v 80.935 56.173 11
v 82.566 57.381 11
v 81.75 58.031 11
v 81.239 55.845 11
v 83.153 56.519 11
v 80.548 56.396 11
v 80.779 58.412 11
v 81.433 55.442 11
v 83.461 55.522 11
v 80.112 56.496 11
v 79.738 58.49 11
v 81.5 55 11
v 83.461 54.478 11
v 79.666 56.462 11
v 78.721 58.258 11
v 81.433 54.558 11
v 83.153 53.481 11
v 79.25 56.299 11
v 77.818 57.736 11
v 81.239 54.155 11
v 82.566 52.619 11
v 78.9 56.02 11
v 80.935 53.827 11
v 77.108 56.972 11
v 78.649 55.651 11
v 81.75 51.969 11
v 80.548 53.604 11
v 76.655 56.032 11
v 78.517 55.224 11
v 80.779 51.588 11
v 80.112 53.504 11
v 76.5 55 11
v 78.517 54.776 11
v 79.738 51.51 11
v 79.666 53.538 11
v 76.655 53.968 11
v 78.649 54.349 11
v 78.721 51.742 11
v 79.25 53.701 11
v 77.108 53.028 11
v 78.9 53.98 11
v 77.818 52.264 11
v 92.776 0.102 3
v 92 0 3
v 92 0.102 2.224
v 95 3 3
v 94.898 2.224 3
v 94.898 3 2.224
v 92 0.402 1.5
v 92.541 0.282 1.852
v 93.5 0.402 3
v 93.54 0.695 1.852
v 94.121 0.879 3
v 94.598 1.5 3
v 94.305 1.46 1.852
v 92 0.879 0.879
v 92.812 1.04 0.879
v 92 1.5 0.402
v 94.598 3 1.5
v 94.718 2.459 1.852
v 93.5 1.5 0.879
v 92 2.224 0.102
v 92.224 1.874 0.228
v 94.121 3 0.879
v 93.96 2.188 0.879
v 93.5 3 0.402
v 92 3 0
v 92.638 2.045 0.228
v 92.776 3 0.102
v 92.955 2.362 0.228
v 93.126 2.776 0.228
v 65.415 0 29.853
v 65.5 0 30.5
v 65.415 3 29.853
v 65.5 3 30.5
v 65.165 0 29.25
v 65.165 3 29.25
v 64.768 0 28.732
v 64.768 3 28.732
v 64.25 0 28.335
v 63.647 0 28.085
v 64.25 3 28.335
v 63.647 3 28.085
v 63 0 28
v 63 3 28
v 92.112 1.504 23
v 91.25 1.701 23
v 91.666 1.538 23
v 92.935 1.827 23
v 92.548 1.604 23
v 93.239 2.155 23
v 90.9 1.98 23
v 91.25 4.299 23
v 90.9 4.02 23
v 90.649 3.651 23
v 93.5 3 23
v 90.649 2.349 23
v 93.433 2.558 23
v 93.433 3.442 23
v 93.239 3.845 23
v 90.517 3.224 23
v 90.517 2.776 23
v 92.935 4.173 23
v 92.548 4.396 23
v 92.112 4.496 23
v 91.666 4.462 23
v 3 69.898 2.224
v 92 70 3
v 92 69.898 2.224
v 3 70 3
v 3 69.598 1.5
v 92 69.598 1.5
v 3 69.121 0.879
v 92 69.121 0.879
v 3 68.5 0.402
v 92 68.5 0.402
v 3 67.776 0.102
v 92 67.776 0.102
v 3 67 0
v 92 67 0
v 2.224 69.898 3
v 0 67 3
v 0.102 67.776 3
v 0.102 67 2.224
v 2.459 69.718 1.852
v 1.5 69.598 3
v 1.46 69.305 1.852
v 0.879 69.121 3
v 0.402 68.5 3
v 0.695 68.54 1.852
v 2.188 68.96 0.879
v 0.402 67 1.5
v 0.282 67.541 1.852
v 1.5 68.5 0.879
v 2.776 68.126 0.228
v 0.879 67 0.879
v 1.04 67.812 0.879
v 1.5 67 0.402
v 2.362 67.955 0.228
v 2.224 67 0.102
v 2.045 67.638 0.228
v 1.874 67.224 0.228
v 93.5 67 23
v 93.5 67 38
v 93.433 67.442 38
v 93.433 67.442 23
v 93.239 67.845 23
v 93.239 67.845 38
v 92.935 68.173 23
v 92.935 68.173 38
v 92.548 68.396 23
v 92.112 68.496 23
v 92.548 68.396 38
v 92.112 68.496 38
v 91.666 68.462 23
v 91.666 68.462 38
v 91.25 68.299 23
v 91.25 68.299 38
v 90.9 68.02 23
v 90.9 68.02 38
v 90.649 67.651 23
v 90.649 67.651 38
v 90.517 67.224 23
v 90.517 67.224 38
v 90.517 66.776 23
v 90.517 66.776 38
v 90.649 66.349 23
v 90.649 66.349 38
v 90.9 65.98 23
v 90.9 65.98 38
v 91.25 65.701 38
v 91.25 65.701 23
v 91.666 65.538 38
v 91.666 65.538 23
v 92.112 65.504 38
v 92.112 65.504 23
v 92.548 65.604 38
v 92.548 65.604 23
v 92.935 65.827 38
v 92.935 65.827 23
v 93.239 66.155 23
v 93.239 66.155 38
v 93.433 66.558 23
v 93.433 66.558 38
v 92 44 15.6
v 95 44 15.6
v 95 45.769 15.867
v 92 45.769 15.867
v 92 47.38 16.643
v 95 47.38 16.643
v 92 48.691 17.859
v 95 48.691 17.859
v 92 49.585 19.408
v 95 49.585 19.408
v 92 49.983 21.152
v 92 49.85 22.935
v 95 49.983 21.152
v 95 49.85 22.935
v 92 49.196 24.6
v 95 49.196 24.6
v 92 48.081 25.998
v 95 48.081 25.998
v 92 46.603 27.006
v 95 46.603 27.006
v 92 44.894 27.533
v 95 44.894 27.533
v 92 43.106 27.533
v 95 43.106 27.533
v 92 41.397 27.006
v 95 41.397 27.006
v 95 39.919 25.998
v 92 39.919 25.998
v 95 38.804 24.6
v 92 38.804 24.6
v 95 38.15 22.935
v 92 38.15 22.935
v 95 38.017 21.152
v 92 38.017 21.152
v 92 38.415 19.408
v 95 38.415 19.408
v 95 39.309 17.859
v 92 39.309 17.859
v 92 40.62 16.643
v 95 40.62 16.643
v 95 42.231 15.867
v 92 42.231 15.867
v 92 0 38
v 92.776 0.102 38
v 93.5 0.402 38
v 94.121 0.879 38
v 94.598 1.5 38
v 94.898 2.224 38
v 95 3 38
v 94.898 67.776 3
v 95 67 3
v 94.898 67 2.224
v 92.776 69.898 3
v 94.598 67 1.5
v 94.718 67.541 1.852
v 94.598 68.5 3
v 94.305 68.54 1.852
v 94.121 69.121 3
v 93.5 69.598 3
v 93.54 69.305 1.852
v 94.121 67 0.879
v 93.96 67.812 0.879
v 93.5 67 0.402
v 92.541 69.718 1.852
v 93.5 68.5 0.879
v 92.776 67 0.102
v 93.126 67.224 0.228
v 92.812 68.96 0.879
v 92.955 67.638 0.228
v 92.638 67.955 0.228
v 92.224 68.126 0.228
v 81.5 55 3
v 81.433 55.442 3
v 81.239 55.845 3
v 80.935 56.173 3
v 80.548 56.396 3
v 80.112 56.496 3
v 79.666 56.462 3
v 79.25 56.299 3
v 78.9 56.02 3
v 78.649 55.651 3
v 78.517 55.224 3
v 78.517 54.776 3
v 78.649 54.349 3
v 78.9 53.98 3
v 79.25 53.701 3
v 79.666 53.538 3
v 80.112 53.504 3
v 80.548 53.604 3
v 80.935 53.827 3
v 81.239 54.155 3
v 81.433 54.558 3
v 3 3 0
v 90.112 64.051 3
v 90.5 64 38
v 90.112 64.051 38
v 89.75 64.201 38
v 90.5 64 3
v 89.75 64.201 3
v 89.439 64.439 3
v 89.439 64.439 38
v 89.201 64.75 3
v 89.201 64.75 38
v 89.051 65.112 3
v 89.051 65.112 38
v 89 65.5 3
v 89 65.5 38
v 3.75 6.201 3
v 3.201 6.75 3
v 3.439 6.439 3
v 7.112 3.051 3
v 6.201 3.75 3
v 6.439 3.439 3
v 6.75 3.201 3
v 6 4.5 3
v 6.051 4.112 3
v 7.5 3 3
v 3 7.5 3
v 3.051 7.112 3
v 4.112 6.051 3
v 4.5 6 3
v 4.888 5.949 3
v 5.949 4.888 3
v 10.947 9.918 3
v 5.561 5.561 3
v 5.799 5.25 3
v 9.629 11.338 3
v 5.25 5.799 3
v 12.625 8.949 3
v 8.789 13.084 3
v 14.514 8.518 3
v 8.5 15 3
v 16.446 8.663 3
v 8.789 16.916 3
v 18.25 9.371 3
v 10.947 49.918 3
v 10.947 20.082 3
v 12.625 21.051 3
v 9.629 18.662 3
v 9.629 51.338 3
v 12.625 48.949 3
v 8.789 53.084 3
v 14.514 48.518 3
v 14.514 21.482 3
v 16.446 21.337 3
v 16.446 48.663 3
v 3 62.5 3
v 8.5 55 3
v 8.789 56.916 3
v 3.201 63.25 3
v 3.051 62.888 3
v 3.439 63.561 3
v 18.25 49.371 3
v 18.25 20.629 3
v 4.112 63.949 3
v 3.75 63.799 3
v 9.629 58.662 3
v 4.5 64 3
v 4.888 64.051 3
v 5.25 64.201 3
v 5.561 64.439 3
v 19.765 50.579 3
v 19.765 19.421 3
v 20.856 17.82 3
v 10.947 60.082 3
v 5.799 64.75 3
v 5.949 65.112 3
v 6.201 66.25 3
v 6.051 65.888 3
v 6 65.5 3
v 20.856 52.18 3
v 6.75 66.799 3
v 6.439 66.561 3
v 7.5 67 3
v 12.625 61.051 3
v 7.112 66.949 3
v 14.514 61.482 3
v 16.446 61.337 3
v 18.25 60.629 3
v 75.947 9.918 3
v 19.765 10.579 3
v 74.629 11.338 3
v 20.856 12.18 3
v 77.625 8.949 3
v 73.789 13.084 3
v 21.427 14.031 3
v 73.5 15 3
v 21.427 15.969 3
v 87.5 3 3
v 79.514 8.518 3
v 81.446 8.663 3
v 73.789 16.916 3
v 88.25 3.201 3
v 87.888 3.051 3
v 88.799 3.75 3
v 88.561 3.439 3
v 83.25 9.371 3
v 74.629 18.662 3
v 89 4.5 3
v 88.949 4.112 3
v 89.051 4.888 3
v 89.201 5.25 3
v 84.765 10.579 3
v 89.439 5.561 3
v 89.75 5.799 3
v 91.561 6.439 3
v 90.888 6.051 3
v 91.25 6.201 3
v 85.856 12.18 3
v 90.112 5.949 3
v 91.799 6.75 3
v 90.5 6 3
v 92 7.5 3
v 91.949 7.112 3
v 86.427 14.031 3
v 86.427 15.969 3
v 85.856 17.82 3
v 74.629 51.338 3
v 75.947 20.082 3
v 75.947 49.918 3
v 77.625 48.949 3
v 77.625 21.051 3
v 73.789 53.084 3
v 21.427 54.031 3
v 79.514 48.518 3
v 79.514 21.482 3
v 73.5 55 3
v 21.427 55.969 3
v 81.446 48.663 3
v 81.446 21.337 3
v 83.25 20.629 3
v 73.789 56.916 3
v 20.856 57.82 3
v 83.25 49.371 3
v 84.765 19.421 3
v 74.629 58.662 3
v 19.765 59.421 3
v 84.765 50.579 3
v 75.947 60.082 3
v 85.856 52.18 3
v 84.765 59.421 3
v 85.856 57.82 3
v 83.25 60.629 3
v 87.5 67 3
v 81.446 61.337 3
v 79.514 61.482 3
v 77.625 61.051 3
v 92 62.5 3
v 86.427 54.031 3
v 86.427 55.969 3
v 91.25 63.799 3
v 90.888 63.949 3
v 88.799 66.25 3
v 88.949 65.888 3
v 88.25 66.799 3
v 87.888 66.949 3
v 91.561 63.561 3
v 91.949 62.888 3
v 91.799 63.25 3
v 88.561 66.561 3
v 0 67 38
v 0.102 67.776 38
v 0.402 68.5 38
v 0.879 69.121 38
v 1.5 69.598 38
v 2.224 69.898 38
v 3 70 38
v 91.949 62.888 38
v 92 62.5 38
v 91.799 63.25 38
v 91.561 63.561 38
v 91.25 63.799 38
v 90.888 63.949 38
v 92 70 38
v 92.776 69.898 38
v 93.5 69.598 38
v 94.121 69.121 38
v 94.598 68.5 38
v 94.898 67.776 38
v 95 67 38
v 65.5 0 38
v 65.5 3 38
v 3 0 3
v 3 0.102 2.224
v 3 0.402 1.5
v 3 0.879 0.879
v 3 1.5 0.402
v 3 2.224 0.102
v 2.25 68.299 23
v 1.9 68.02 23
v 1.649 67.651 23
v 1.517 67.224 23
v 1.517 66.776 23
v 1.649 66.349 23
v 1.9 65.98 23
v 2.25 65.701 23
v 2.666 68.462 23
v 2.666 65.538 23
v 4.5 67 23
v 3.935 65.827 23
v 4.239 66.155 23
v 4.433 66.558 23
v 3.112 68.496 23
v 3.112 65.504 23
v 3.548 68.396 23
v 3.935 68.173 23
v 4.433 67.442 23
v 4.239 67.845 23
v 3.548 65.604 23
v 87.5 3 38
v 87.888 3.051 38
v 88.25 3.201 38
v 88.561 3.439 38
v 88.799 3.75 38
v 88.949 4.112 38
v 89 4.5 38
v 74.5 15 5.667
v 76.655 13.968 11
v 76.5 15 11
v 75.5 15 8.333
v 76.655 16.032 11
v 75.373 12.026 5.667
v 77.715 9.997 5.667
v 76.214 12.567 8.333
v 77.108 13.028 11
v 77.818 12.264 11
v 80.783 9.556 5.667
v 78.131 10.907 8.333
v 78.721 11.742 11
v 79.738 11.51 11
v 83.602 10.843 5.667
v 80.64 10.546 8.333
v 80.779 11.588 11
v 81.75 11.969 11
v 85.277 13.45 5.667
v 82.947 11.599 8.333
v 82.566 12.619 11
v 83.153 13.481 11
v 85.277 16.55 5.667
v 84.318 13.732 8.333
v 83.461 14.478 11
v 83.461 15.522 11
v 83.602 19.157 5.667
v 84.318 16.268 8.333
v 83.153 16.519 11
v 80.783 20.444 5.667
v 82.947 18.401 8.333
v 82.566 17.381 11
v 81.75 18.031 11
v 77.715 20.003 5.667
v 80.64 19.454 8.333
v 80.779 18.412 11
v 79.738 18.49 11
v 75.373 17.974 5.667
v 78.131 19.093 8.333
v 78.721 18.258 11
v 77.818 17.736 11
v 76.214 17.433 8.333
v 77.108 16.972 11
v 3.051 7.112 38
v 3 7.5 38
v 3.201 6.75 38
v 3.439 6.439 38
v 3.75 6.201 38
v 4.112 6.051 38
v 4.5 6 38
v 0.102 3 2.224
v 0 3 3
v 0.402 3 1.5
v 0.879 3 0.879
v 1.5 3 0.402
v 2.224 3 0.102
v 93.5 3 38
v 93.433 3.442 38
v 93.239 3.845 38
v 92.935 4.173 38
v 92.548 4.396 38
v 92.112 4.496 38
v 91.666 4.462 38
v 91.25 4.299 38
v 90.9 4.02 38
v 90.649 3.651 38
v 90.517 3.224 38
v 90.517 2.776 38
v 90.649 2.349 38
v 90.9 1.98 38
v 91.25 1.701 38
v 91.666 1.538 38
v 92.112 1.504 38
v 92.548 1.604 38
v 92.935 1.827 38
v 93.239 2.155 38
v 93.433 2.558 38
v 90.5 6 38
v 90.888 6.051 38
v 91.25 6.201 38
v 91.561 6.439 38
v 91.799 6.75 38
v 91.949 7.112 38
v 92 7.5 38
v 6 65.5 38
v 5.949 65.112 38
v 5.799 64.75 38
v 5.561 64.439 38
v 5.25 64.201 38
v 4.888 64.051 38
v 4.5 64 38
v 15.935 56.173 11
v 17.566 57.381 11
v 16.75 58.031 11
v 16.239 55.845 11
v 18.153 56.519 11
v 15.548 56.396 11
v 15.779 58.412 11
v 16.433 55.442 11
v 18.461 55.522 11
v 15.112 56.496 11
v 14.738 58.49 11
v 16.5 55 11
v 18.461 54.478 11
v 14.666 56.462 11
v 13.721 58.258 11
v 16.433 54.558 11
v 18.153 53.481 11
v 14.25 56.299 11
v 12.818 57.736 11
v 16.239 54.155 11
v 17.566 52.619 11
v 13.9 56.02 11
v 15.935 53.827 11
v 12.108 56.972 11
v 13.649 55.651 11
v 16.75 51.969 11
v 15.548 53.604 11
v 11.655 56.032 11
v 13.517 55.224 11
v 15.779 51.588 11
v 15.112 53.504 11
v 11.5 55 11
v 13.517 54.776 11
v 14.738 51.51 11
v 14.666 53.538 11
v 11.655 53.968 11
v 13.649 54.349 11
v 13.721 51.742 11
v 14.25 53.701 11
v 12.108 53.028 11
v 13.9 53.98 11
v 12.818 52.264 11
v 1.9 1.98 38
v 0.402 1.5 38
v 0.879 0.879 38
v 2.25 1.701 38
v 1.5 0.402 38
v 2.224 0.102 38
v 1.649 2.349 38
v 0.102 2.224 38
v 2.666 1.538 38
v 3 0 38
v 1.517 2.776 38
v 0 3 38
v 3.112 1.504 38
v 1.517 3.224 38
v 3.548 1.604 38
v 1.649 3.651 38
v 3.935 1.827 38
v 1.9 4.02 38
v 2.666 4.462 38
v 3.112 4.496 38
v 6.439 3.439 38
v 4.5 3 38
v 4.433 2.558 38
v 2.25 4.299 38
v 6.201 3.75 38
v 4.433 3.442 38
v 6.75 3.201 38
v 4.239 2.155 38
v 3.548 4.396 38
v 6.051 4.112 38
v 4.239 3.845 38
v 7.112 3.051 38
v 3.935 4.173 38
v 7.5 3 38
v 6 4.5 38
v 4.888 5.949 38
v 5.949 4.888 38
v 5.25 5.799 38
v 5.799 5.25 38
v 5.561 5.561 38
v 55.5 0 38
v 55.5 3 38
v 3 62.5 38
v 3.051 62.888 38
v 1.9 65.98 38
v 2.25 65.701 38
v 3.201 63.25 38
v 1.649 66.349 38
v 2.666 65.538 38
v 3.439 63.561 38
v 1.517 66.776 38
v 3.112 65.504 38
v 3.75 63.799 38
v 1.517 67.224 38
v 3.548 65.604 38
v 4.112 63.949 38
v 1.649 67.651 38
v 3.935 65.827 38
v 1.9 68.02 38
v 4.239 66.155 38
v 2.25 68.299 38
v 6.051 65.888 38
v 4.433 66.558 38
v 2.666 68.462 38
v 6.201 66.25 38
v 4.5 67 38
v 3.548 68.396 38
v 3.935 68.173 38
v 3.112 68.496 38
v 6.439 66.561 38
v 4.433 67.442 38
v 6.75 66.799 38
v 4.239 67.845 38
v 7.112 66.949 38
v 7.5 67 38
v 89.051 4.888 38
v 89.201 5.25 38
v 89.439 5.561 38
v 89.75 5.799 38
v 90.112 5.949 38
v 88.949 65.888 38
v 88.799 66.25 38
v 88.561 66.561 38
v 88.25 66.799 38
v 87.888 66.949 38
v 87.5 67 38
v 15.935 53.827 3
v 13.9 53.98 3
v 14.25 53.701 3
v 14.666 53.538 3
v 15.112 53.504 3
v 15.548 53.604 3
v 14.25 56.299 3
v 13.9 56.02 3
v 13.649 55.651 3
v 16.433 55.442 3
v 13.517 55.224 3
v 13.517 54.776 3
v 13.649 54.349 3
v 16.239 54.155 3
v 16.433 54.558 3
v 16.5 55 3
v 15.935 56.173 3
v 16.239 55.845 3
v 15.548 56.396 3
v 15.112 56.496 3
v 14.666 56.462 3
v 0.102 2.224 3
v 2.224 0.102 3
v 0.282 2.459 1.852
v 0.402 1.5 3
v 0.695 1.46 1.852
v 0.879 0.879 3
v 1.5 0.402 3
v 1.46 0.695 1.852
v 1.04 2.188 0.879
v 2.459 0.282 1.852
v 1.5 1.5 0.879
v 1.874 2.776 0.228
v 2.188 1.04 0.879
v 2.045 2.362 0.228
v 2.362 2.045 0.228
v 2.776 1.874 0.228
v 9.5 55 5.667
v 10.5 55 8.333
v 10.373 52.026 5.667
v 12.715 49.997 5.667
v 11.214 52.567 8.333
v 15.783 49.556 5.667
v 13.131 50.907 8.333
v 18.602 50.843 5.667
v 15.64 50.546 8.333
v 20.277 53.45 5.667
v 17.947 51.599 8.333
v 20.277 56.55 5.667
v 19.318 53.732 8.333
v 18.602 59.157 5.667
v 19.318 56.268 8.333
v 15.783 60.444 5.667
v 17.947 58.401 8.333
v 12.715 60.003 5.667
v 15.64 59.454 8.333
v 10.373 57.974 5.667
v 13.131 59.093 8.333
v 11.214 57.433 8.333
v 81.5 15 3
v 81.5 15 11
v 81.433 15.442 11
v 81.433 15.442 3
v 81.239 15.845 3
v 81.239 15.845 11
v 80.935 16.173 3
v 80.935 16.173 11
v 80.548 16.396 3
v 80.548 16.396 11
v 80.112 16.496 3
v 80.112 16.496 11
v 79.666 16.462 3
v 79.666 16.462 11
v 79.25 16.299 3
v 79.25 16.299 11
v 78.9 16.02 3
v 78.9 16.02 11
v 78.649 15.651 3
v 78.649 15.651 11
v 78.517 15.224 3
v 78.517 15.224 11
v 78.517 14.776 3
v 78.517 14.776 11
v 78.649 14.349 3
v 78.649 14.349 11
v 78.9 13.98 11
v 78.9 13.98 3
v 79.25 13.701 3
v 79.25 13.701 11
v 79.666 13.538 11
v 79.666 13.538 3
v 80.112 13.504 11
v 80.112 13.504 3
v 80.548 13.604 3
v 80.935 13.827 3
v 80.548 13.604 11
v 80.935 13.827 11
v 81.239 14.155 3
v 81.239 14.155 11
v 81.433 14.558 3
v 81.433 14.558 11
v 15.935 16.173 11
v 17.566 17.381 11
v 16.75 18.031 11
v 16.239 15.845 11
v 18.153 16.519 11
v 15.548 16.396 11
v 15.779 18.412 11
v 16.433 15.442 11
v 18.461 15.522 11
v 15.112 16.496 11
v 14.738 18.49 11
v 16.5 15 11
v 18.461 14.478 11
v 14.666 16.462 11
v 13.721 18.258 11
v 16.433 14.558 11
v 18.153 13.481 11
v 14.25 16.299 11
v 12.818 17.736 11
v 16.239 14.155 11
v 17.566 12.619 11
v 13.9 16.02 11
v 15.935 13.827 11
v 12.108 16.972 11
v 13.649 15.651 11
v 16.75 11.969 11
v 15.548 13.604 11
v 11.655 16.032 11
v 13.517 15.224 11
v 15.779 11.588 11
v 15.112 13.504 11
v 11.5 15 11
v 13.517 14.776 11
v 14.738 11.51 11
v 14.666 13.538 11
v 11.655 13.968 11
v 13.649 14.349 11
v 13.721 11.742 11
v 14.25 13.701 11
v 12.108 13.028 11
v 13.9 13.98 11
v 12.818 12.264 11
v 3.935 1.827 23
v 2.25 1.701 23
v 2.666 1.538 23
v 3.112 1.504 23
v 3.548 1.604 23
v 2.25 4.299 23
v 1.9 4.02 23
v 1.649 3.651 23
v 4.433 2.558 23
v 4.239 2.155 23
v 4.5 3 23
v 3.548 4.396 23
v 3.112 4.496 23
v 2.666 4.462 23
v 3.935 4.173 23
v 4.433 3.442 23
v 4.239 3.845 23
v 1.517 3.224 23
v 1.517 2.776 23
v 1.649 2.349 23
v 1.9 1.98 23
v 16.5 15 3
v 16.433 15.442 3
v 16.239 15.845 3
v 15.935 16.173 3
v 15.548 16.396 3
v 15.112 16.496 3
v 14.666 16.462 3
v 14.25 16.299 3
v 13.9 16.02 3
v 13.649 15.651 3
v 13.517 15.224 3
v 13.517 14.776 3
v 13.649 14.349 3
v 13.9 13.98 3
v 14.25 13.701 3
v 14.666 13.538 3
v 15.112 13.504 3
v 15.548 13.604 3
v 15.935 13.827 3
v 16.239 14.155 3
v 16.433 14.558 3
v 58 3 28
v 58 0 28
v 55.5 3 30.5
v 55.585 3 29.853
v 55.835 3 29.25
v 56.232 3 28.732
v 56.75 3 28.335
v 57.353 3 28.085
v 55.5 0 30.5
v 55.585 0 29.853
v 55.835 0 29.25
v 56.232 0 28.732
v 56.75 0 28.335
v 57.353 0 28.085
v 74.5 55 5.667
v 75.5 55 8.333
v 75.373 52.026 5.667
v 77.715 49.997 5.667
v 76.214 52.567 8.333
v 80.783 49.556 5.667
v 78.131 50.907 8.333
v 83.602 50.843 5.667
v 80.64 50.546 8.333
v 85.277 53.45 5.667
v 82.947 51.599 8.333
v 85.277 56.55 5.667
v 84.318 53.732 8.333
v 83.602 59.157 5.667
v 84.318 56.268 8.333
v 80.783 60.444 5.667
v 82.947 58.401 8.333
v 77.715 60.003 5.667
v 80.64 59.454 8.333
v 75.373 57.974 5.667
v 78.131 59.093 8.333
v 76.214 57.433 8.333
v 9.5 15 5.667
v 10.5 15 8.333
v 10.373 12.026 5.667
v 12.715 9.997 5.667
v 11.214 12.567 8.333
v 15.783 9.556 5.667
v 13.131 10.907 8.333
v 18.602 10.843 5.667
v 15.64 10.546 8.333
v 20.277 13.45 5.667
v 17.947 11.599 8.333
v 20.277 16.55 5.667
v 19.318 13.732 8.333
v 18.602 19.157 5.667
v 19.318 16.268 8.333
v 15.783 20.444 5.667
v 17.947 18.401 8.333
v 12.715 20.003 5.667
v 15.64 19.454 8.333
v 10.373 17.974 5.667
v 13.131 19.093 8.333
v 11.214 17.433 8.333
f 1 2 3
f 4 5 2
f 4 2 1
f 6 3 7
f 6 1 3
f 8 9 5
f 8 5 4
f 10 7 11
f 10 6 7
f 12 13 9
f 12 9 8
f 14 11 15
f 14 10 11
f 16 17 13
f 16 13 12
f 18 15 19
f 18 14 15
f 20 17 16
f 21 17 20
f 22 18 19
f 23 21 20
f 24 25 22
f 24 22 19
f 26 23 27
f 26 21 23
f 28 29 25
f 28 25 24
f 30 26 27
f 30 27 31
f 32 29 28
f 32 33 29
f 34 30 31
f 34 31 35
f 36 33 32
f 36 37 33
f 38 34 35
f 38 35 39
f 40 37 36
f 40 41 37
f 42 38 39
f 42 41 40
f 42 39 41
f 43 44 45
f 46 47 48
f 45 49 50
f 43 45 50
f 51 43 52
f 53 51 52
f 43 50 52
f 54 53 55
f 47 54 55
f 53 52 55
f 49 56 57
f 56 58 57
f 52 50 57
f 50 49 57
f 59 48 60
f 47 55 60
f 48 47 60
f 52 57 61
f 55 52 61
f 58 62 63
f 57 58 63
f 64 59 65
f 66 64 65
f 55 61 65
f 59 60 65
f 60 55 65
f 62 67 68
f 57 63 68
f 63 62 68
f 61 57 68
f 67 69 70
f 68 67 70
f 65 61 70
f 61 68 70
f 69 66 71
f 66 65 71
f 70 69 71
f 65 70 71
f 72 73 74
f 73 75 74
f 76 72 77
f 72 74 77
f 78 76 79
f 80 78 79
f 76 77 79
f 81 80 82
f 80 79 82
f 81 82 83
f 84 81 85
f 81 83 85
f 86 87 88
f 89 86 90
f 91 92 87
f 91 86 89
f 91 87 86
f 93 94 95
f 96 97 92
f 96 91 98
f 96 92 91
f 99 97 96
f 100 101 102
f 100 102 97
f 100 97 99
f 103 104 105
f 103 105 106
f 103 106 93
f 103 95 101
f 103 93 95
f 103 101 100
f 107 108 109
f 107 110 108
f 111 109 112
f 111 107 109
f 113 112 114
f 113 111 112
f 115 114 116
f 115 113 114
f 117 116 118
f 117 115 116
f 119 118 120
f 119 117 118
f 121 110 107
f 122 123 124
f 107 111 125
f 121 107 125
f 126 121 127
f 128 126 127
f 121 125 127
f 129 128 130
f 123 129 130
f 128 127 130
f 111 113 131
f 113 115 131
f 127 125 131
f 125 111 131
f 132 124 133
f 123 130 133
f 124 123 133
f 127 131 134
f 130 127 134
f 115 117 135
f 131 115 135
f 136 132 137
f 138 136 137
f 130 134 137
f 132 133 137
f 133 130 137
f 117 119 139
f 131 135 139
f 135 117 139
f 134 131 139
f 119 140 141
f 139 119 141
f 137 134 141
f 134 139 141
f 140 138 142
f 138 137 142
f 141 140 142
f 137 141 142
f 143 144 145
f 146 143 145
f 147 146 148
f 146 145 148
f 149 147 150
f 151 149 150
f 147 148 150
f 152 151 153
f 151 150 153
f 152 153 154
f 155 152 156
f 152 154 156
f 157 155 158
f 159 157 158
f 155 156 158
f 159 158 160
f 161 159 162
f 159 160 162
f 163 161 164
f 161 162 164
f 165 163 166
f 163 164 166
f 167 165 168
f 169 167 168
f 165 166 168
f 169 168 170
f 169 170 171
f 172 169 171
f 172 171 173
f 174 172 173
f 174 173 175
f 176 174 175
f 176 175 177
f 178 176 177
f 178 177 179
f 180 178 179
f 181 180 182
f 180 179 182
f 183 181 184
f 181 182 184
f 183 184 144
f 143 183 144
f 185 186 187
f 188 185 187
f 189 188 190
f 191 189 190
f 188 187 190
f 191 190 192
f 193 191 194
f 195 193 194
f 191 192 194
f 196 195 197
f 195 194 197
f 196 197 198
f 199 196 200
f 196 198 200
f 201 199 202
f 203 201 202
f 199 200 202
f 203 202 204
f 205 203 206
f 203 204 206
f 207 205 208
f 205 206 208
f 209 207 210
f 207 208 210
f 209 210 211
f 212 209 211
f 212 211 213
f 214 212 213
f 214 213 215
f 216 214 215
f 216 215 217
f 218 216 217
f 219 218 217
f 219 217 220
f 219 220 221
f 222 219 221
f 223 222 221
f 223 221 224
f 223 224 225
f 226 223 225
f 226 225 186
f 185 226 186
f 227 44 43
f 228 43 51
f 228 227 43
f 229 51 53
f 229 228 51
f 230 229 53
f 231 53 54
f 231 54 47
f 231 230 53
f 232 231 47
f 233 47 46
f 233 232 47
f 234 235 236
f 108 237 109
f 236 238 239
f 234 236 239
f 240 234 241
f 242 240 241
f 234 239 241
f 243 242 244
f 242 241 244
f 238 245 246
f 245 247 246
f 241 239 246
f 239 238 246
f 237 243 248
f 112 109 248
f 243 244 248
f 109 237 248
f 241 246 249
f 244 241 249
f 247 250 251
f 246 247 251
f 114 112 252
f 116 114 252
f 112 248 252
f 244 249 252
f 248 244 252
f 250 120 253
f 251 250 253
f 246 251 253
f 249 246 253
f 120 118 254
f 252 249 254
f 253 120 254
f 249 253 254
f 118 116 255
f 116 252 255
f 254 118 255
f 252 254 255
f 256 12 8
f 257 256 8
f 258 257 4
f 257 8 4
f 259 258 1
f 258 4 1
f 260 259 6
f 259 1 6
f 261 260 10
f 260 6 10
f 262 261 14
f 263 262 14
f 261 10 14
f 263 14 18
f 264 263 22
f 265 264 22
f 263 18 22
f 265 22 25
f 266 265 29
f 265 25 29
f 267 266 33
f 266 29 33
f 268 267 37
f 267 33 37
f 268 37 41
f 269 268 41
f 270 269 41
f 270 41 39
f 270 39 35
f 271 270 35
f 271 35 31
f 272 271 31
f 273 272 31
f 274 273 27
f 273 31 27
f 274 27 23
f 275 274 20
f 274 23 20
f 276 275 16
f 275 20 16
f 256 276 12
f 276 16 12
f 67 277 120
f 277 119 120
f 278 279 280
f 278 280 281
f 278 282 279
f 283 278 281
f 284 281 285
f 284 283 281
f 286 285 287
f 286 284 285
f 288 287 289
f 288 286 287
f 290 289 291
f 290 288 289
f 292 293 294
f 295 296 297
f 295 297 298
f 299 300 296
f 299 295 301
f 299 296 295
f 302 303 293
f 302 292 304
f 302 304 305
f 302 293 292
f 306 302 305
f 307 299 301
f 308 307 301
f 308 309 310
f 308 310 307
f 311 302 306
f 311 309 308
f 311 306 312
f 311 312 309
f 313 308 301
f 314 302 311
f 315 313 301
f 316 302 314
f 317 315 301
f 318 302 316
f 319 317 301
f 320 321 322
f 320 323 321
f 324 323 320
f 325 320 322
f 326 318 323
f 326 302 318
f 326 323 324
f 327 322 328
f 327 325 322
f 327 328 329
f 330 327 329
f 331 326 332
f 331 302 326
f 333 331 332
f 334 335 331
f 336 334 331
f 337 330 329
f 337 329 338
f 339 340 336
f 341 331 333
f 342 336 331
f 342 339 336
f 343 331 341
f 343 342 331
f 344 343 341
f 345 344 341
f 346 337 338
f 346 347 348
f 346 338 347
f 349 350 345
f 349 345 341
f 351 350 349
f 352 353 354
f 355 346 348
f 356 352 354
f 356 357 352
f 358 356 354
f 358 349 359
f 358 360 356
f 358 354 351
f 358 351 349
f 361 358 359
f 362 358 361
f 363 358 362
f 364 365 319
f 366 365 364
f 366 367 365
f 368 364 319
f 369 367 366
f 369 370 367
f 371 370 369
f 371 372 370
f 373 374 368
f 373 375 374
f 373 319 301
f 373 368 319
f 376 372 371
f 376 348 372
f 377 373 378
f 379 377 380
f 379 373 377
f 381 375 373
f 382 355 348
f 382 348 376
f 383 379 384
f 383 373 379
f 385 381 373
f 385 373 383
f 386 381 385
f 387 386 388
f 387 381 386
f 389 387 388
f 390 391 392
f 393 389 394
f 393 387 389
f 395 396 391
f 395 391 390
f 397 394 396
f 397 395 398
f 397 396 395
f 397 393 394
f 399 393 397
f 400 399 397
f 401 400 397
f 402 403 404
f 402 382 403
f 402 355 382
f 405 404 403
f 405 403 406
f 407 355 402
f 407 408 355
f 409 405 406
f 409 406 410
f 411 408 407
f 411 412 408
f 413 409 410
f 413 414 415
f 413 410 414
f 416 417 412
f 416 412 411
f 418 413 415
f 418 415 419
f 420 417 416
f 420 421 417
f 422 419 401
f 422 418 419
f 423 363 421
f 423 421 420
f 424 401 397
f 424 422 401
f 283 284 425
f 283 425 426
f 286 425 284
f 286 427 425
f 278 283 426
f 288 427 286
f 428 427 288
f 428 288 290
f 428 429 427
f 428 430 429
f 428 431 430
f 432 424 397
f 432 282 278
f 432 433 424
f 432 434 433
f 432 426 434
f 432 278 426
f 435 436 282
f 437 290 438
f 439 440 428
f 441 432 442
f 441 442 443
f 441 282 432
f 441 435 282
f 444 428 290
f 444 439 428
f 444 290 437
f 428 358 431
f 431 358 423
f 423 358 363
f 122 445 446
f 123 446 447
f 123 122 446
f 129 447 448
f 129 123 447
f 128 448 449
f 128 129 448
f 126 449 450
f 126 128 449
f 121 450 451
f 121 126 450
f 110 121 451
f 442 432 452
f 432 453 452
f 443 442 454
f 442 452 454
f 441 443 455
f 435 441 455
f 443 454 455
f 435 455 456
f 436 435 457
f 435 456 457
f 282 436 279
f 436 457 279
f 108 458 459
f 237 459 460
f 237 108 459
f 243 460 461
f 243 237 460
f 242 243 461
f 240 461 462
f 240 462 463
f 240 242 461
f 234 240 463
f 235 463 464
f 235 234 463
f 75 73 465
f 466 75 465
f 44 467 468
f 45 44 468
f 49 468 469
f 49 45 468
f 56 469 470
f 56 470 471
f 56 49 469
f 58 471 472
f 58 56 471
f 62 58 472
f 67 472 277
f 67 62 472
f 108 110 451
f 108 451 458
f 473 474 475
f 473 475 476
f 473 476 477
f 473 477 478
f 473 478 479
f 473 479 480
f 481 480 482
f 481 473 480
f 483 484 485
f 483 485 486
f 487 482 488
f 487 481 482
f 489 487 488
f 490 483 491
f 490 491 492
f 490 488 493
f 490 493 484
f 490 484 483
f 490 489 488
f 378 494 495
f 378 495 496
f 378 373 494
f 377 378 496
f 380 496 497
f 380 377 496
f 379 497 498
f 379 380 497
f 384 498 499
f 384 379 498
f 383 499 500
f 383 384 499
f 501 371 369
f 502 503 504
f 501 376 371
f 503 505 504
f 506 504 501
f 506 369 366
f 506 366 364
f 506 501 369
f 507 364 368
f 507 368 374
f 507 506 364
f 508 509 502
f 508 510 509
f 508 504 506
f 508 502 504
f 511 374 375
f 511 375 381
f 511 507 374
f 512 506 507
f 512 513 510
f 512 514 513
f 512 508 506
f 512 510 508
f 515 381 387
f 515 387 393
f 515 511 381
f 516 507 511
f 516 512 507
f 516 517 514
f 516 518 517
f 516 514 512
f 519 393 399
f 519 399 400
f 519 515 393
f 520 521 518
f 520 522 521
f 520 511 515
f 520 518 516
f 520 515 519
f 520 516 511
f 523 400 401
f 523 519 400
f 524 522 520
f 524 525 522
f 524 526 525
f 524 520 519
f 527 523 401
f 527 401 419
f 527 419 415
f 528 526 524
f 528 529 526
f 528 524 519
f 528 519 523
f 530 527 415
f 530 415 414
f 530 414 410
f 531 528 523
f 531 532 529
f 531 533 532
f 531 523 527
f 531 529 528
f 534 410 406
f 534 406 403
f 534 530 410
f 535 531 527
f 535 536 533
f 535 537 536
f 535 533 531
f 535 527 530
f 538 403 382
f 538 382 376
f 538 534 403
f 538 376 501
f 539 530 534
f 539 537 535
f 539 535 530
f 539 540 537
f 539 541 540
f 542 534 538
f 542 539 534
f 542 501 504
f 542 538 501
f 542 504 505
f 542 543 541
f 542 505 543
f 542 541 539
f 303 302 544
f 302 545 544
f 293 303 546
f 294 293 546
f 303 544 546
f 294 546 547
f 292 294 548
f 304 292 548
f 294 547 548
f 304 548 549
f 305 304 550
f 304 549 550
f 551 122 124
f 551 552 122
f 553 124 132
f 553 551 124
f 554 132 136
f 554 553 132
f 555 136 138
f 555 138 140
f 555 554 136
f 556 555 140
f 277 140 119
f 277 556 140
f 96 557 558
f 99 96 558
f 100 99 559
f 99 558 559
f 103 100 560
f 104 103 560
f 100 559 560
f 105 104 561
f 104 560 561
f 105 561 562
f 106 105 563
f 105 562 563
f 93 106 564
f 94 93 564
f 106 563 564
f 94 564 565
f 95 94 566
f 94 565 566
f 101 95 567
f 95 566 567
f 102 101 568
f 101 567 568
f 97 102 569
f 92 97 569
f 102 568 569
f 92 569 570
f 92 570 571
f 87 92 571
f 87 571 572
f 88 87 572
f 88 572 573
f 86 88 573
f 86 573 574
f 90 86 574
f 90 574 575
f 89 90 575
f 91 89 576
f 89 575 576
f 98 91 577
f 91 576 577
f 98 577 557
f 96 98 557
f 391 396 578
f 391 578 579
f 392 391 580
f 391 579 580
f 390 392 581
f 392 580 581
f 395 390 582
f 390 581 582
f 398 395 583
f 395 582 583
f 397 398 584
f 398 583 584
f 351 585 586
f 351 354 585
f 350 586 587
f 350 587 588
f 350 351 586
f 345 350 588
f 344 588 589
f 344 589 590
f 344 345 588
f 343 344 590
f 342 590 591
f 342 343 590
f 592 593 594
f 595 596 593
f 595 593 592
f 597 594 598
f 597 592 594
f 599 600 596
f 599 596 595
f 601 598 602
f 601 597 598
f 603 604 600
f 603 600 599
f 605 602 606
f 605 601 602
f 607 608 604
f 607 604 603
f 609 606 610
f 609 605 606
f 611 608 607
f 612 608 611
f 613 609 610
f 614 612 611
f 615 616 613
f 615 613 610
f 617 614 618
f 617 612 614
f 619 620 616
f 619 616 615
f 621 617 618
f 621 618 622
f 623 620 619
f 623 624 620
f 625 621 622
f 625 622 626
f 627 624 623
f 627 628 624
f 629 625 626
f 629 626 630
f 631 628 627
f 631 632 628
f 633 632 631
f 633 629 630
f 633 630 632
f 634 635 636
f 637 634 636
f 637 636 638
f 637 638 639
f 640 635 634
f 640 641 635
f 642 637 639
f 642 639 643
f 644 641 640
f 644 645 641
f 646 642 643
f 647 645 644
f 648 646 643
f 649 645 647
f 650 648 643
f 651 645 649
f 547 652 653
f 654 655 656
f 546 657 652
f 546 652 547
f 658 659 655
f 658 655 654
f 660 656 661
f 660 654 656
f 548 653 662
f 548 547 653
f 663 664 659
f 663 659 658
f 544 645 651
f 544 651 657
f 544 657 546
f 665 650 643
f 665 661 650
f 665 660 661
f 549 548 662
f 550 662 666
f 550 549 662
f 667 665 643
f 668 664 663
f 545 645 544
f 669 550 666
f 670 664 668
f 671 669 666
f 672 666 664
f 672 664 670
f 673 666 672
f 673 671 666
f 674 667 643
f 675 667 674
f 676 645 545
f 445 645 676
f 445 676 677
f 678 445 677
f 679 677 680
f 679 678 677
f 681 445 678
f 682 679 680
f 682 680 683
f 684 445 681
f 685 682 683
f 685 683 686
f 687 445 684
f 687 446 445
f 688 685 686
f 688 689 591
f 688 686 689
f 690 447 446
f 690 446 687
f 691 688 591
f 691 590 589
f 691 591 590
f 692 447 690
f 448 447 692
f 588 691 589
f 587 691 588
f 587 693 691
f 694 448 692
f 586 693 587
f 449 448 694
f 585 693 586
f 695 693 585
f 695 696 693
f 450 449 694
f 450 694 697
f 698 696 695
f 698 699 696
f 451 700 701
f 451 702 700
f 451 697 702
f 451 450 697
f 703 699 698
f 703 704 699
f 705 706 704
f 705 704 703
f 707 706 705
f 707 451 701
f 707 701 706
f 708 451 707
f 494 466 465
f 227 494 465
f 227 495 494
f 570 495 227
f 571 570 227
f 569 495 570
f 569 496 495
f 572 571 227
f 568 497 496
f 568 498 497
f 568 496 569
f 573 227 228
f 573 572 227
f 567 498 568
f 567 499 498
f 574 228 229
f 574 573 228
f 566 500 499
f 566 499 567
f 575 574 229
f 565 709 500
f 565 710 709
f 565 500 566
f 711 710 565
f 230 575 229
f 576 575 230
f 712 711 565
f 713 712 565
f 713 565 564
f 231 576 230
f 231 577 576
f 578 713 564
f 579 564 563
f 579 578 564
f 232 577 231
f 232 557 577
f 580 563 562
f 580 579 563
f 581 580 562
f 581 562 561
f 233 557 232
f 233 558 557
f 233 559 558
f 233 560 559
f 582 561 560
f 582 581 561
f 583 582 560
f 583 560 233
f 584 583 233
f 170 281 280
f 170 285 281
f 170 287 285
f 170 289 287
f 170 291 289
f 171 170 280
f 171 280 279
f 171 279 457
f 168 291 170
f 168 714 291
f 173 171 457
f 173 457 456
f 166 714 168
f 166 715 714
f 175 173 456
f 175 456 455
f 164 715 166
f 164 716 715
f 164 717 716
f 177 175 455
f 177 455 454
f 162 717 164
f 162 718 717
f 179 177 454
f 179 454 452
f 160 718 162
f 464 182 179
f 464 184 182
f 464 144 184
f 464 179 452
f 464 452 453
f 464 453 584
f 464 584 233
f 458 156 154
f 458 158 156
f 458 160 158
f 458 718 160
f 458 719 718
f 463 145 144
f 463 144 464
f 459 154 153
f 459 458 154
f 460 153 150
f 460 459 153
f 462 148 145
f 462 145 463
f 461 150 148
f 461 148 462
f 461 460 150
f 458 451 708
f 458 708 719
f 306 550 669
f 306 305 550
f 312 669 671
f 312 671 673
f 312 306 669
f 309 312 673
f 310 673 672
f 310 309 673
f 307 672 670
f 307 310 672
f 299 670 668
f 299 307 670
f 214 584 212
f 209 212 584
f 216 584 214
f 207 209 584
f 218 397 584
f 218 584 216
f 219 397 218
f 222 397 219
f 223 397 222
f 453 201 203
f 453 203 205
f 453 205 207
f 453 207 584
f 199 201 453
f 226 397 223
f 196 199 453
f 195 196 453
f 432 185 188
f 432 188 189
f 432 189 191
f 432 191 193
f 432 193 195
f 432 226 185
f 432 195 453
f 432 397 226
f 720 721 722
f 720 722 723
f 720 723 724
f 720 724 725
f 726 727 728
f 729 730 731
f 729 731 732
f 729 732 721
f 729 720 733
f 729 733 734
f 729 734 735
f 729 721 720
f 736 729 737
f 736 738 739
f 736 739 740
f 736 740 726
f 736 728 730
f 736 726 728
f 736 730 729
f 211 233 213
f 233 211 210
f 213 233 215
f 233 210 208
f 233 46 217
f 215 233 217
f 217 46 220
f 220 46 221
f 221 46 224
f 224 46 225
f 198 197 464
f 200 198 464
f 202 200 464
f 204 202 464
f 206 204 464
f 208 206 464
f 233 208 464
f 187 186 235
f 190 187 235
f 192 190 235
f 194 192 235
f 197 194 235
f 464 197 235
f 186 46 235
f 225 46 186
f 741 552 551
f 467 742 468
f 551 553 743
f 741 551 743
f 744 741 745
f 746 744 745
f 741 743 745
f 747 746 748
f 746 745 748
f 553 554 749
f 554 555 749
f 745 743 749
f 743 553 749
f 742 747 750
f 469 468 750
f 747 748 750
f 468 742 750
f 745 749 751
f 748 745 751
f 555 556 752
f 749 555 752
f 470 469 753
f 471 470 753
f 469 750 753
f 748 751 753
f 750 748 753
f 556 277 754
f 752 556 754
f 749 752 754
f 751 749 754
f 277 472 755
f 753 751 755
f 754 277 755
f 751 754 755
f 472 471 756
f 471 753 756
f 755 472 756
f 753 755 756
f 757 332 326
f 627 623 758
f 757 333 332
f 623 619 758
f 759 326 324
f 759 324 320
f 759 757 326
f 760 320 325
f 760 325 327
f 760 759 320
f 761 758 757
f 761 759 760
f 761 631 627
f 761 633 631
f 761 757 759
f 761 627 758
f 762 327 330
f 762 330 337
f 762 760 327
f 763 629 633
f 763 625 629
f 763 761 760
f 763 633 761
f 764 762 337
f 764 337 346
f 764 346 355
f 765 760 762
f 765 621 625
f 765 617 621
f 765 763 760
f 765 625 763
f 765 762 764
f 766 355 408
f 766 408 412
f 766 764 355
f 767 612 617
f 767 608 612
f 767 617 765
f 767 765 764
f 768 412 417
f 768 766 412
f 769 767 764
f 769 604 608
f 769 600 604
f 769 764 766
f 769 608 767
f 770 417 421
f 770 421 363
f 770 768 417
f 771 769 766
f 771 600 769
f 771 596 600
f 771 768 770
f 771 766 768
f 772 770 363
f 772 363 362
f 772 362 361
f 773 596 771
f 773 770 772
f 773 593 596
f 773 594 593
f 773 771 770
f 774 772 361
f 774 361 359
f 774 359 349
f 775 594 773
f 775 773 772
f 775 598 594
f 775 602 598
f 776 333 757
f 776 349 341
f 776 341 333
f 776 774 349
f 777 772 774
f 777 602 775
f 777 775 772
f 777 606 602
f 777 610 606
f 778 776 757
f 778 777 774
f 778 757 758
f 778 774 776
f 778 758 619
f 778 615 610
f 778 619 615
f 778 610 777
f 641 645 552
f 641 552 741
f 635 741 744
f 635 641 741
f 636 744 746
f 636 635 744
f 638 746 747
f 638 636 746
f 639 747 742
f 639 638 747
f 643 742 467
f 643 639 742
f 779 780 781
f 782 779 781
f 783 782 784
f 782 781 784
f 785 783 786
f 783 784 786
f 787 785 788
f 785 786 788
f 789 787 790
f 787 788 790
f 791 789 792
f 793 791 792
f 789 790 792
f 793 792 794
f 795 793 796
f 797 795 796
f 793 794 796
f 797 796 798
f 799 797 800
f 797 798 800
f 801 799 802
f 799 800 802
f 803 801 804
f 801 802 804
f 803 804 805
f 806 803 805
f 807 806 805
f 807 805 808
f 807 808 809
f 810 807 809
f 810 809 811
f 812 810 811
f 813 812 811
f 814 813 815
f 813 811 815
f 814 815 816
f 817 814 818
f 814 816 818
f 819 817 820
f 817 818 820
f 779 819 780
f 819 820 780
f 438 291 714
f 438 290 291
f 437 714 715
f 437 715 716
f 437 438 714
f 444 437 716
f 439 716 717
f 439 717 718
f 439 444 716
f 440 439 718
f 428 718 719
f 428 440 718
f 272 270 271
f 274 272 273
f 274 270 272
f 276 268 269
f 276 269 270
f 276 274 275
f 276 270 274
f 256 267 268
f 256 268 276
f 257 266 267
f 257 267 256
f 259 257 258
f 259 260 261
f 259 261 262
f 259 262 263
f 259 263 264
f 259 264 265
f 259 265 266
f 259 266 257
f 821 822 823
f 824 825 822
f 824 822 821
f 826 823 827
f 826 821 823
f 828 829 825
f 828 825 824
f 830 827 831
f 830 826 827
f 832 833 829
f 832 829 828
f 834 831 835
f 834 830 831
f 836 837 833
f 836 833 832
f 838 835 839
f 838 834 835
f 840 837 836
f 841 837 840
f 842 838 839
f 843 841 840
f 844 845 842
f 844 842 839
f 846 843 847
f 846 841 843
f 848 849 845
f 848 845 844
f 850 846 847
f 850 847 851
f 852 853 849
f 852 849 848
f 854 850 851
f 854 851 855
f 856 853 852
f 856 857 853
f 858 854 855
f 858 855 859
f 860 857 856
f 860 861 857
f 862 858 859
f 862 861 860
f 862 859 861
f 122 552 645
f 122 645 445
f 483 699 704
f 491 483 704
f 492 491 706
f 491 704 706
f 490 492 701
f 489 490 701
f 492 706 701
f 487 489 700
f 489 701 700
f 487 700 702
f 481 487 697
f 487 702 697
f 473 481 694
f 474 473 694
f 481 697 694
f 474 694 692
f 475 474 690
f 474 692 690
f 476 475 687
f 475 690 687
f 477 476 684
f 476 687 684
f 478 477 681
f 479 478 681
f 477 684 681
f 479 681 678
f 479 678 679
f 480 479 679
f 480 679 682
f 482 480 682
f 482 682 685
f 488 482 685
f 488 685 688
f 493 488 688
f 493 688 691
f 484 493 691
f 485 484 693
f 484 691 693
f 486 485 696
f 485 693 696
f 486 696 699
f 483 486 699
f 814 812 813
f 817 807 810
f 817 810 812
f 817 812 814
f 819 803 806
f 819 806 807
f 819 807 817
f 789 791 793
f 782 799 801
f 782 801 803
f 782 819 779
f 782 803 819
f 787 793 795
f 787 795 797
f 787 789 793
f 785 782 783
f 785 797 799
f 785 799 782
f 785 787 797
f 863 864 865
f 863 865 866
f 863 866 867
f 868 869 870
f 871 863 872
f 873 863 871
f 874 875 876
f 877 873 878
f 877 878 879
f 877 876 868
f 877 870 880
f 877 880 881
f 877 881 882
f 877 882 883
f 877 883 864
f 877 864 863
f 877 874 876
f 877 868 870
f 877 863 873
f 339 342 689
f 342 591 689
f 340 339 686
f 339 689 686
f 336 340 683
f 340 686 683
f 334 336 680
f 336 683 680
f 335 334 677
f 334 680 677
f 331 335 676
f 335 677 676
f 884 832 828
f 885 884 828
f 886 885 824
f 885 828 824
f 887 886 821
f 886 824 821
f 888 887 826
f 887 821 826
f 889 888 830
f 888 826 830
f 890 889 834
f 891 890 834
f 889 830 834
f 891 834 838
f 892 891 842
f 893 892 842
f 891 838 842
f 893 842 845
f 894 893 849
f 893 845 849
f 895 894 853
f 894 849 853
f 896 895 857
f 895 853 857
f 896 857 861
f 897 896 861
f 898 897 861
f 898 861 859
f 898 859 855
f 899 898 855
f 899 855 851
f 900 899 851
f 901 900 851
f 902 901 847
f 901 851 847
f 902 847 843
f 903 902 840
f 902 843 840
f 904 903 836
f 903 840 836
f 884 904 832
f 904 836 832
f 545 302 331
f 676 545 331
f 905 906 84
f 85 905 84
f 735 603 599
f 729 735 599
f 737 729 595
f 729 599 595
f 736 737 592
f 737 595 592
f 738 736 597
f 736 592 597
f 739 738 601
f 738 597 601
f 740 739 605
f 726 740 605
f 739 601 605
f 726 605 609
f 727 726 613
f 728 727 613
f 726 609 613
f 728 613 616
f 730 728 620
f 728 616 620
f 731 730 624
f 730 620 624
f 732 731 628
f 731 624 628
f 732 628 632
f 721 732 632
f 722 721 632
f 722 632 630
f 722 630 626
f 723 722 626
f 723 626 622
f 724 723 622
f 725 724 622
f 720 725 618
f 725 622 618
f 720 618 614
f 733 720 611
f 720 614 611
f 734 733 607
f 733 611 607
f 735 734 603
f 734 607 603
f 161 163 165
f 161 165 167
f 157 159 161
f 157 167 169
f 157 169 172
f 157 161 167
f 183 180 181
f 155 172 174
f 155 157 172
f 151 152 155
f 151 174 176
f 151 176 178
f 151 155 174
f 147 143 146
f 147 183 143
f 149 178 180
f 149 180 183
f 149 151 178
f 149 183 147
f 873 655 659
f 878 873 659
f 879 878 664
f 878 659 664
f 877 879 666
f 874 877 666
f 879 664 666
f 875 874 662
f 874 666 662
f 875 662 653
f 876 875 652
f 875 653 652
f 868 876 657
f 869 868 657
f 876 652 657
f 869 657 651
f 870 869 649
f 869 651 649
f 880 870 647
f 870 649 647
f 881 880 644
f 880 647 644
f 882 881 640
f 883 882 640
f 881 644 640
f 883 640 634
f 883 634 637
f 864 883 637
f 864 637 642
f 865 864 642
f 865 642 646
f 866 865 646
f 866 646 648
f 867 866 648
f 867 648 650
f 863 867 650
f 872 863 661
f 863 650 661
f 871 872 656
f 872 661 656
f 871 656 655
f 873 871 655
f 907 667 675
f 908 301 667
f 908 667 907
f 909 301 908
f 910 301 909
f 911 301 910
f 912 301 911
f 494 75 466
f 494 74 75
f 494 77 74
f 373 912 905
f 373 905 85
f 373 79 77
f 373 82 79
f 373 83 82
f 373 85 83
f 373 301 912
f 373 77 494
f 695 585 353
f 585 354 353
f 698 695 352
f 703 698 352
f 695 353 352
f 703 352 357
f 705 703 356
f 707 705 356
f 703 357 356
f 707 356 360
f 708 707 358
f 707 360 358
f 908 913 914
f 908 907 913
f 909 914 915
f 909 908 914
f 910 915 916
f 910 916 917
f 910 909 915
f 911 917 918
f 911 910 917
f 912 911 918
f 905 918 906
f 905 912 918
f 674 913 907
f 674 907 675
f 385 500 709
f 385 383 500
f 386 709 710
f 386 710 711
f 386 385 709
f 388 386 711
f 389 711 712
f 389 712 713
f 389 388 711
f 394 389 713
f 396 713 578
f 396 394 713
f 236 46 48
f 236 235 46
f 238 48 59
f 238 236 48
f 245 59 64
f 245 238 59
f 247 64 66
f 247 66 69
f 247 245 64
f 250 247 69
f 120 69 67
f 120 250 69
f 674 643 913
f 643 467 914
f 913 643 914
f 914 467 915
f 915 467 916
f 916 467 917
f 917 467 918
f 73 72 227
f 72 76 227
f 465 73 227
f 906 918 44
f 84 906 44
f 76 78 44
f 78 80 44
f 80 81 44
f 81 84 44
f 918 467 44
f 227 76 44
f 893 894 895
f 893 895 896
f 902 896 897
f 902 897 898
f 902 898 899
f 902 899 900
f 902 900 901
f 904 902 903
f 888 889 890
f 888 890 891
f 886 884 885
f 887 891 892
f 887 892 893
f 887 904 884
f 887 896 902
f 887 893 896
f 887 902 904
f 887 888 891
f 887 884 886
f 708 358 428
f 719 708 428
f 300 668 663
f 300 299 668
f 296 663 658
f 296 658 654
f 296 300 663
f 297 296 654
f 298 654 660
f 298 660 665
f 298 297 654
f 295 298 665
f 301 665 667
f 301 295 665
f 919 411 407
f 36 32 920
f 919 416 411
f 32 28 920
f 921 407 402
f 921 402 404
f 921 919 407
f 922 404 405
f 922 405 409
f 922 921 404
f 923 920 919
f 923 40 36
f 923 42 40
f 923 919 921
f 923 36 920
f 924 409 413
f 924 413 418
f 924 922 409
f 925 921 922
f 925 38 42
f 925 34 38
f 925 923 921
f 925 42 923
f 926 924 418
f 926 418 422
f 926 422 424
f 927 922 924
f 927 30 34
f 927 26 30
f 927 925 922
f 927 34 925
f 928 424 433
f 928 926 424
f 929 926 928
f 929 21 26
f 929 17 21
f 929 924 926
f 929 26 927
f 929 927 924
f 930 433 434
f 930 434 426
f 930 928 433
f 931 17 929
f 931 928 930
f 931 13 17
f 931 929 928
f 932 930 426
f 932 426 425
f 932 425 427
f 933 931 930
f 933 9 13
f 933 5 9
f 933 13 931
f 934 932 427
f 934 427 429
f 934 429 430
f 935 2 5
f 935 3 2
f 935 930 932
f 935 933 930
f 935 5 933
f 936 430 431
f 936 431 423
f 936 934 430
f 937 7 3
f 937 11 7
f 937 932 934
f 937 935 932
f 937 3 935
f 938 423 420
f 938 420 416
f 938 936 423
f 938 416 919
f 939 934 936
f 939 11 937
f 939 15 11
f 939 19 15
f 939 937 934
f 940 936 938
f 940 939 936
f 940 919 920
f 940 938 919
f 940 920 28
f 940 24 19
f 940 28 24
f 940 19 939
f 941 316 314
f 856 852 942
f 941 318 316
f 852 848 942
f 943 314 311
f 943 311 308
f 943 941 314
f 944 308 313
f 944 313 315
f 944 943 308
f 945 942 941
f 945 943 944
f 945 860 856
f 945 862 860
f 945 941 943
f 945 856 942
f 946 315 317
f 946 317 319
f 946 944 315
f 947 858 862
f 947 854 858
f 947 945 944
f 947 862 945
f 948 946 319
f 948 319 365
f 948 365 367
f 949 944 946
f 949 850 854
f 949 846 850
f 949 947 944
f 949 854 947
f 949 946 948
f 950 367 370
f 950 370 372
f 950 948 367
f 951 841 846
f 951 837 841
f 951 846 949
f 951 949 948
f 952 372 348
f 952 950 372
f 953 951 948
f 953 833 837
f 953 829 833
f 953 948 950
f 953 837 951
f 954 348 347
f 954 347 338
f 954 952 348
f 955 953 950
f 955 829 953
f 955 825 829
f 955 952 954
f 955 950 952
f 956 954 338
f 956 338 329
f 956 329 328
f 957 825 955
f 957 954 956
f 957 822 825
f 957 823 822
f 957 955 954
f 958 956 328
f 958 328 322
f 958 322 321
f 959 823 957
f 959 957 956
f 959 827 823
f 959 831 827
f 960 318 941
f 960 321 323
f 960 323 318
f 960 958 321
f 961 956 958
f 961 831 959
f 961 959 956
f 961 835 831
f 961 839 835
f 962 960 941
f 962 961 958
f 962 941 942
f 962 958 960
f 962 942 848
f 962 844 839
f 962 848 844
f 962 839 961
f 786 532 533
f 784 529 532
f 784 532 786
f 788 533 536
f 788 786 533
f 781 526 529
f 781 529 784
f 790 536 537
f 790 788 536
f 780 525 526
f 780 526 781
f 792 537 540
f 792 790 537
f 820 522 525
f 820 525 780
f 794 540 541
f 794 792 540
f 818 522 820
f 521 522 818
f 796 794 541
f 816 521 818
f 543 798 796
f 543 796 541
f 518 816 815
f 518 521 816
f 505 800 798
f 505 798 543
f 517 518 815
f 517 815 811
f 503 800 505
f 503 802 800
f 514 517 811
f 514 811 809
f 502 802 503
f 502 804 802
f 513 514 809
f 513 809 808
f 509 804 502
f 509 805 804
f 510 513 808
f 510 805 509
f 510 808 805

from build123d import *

# Parameters (mm, degrees)
SKETCH_1_W          = 95
SKETCH_1_H          = 70
EXTRUDE_1_DEPTH     = 3
SKETCH_2_R          = 3.5
EXTRUDE_2_DEPTH     = 8
SKETCH_3_R          = 1.5
CUT_EXTRUDE_1_DEPTH = 8
CHAMFER_2_SIZE      = 3
CHAMFER_2_SIZE_2    = 8
SKETCH_6_W          = 95
SKETCH_6_H          = 70
SKETCH_6_W_2        = 89
SKETCH_6_H_2        = 64
EXTRUDE_3_DEPTH     = 35
SKETCH_8_W          = 6
SKETCH_8_H          = 6
EXTRUDE_4_DEPTH     = 35
FILLET_4_R          = 1.5
SKETCH_10_R         = 1.5
CUT_EXTRUDE_2_DEPTH = 15
FILLET_6_R          = 3
SKETCH_11_R         = 6
CUT_EXTRUDE_3_DEPTH = 15
SKETCH_12_W         = 10
SKETCH_12_H         = 10
CUT_EXTRUDE_4_DEPTH = 15
FILLET_9_R          = 2.5
FILLET_10_R         = 3


# Some blends are built 0.0001 mm under size
with BuildPart() as part:
    # ｽｹｯﾁ1 → ﾎﾞｽ - 押し出し1 (new body)
    with BuildSketch(Plane.XY):
        with Locations((47.5, 35)):
            Rectangle(SKETCH_1_W, SKETCH_1_H)
    extrude(amount=EXTRUDE_1_DEPTH)

    # ｽｹｯﾁ2 → ﾎﾞｽ - 押し出し2 (add)
    with BuildSketch(Plane.XY.offset(3)):
        with Locations(Location((15, 55, 0), (0, 0, 180))):
            Circle(SKETCH_2_R)
        with Locations(Location((15, 15, 0), (0, 0, 180))):
            Circle(SKETCH_2_R)
        with Locations(Location((80, 55, 0), (0, 0, 180))):
            Circle(SKETCH_2_R)
        with Locations(Location((80, 15, 0), (0, 0, 180))):
            Circle(SKETCH_2_R)
    extrude(amount=EXTRUDE_2_DEPTH)

    # ｽｹｯﾁ3 → ｶｯﾄ - 押し出し1 (cut)
    with BuildSketch(Plane.XY.offset(11)):
        with Locations((15, 55)):
            Circle(SKETCH_3_R)
        with Locations((80, 55)):
            Circle(SKETCH_3_R)
        with Locations((15, 15)):
            Circle(SKETCH_3_R)
        with Locations((80, 15)):
            Circle(SKETCH_3_R)
    extrude(amount=-CUT_EXTRUDE_1_DEPTH, mode=Mode.SUBTRACT)

    # 面取り2
    # the kernel refuses this chamfer: 8, 3 mm, written as the material it adds along each edge
    with BuildSketch(Plane(origin=(15, 55, 3), x_dir=(-1, 0, 0), z_dir=(0, 1, 0))) as chamfer_2_piece_1_section:
        Polygon((3.5 + CHAMFER_2_SIZE, 0), (3.5, CHAMFER_2_SIZE_2), (3.5, 0), align=None)
    chamfer_2_piece_1 = revolve(axis=Axis((15, 55, 3), (0, 0, 1)), mode=Mode.PRIVATE)
    chamfer_2_piece_1 = split(chamfer_2_piece_1, bisect_by=Plane(origin=(19.987700919, 55, 11), z_dir=(0, 0, -1)), keep=Keep.TOP, mode=Mode.PRIVATE)
    add(chamfer_2_piece_1)
    with BuildSketch(Plane(origin=(15, 15, 3), x_dir=(-1, 0, 0), z_dir=(0, 1, 0))) as chamfer_2_piece_2_section:
        Polygon((3.5 + CHAMFER_2_SIZE, 0), (3.5, CHAMFER_2_SIZE_2), (3.5, 0), align=None)
    chamfer_2_piece_2 = revolve(axis=Axis((15, 15, 3), (0, 0, 1)), mode=Mode.PRIVATE)
    chamfer_2_piece_2 = split(chamfer_2_piece_2, bisect_by=Plane(origin=(19.987700919, 15, 11), z_dir=(0, 0, -1)), keep=Keep.TOP, mode=Mode.PRIVATE)
    add(chamfer_2_piece_2)
    with BuildSketch(Plane(origin=(80, 55, 3), x_dir=(-1, 0, 0), z_dir=(0, 1, 0))) as chamfer_2_piece_3_section:
        Polygon((3.5 + CHAMFER_2_SIZE, 0), (3.5, CHAMFER_2_SIZE_2), (3.5, 0), align=None)
    chamfer_2_piece_3 = revolve(axis=Axis((80, 55, 3), (0, 0, 1)), mode=Mode.PRIVATE)
    chamfer_2_piece_3 = split(chamfer_2_piece_3, bisect_by=Plane(origin=(84.987700919, 55, 11), z_dir=(0, 0, -1)), keep=Keep.TOP, mode=Mode.PRIVATE)
    add(chamfer_2_piece_3)
    with BuildSketch(Plane(origin=(80, 15, 3), x_dir=(-1, 0, 0), z_dir=(0, 1, 0))) as chamfer_2_piece_4_section:
        Polygon((3.5 + CHAMFER_2_SIZE, 0), (3.5, CHAMFER_2_SIZE_2), (3.5, 0), align=None)
    chamfer_2_piece_4 = revolve(axis=Axis((80, 15, 3), (0, 0, 1)), mode=Mode.PRIVATE)
    chamfer_2_piece_4 = split(chamfer_2_piece_4, bisect_by=Plane(origin=(84.987700919, 15, 11), z_dir=(0, 0, -1)), keep=Keep.TOP, mode=Mode.PRIVATE)
    add(chamfer_2_piece_4)

    # ｽｹｯﾁ6 → ﾎﾞｽ - 押し出し3 (add)
    with BuildSketch(Plane.XY.offset(3)):
        with Locations((47.5, 35)):
            Rectangle(SKETCH_6_W, SKETCH_6_H)
        with Locations((47.5, 35)):
            Rectangle(SKETCH_6_W_2, SKETCH_6_H_2, mode=Mode.SUBTRACT)
    extrude(amount=EXTRUDE_3_DEPTH)

    # ｽｹｯﾁ8 → ﾎﾞｽ - 押し出し4 (add)
    with BuildSketch(Plane.XY.offset(38)):
        with Locations((3, 67)):
            Rectangle(SKETCH_8_W, SKETCH_8_H)
        with Locations((92, 67)):
            Rectangle(SKETCH_8_W, SKETCH_8_H)
        with Locations((3, 3)):
            Rectangle(SKETCH_8_W, SKETCH_8_H)
        with Locations((92, 3)):
            Rectangle(SKETCH_8_W, SKETCH_8_H)
    extrude(amount=-EXTRUDE_4_DEPTH)

    # ﾌｨﾚｯﾄ4
    fillet_4_edges = [part.edges().sort_by_distance(p)[0] for p in [
        (92, 6, 20.5),
        (89, 6, 20.5),
        (89, 3, 20.5),
        (6, 3, 20.5),
        (6, 6, 20.5),
        (3, 6, 20.5),
        (92, 64, 20.5),
        (89, 64, 20.5),
        (89, 67, 20.5),
        (6, 64, 20.5),
        (6, 67, 20.5),
        (3, 64, 20.5),
    ]]
    fillet(fillet_4_edges, radius=FILLET_4_R - 0.0001)  # a hair under: the kernel refuses the full size

    # ｽｹｯﾁ10 → ｶｯﾄ - 押し出し2 (cut)
    with BuildSketch(Plane.XY.offset(38)):
        with Locations((3, 67)):
            Circle(SKETCH_10_R)
        with Locations((92, 67)):
            Circle(SKETCH_10_R)
        with Locations((3, 3)):
            Circle(SKETCH_10_R)
        with Locations((92, 3)):
            Circle(SKETCH_10_R)
    extrude(amount=-CUT_EXTRUDE_2_DEPTH, mode=Mode.SUBTRACT)

    # ﾌｨﾚｯﾄ6
    fillet_6_edges = [part.edges().sort_by_distance(p)[0] for p in [
        (0, 70, 19),
        (95, 70, 19),
        (95, 0, 19),
        (0, 0, 19),
    ]]
    fillet(fillet_6_edges, radius=FILLET_6_R)

    # ｽｹｯﾁ11 → ｶｯﾄ - 押し出し3 (cut)
    with BuildSketch(Plane(origin=(95, 0, 0), x_dir=(0, 0, -1), z_dir=(1, 0, 0))):
        with Locations((-21.599978, 44)):
            Circle(SKETCH_11_R)
    extrude(amount=-CUT_EXTRUDE_3_DEPTH, mode=Mode.SUBTRACT)

    # ｽｹｯﾁ12 → ｶｯﾄ - 押し出し4 (cut)
    with BuildSketch(Plane.XZ):
        with Locations((60.5, 33)):
            Rectangle(SKETCH_12_W, SKETCH_12_H)
    extrude(amount=-CUT_EXTRUDE_4_DEPTH, mode=Mode.SUBTRACT)

    # ﾌｨﾚｯﾄ9
    fillet_9_edges = [part.edges().sort_by_distance(p)[0] for p in [
        (65.5, 1.5, 28),
        (55.5, 1.5, 28),
    ]]
    fillet(fillet_9_edges, radius=FILLET_9_R)

    # ﾌｨﾚｯﾄ10
    fillet_10_edges = [part.edges().sort_by_distance(p)[0] for p in [
        (47.5, 0, 0),
        (0, 35, 0),
        (47.5, 70, 0),
        (95, 35, 0),
        (0.878679656, 69.121320344, 0),
        (94.121320344, 69.121320344, 0),
        (94.121320344, 0.878679656, 0),
        (0.878679656, 0.878679656, 0),
    ]]
    fillet(fillet_10_edges, radius=FILLET_10_R)


solid = part.part
